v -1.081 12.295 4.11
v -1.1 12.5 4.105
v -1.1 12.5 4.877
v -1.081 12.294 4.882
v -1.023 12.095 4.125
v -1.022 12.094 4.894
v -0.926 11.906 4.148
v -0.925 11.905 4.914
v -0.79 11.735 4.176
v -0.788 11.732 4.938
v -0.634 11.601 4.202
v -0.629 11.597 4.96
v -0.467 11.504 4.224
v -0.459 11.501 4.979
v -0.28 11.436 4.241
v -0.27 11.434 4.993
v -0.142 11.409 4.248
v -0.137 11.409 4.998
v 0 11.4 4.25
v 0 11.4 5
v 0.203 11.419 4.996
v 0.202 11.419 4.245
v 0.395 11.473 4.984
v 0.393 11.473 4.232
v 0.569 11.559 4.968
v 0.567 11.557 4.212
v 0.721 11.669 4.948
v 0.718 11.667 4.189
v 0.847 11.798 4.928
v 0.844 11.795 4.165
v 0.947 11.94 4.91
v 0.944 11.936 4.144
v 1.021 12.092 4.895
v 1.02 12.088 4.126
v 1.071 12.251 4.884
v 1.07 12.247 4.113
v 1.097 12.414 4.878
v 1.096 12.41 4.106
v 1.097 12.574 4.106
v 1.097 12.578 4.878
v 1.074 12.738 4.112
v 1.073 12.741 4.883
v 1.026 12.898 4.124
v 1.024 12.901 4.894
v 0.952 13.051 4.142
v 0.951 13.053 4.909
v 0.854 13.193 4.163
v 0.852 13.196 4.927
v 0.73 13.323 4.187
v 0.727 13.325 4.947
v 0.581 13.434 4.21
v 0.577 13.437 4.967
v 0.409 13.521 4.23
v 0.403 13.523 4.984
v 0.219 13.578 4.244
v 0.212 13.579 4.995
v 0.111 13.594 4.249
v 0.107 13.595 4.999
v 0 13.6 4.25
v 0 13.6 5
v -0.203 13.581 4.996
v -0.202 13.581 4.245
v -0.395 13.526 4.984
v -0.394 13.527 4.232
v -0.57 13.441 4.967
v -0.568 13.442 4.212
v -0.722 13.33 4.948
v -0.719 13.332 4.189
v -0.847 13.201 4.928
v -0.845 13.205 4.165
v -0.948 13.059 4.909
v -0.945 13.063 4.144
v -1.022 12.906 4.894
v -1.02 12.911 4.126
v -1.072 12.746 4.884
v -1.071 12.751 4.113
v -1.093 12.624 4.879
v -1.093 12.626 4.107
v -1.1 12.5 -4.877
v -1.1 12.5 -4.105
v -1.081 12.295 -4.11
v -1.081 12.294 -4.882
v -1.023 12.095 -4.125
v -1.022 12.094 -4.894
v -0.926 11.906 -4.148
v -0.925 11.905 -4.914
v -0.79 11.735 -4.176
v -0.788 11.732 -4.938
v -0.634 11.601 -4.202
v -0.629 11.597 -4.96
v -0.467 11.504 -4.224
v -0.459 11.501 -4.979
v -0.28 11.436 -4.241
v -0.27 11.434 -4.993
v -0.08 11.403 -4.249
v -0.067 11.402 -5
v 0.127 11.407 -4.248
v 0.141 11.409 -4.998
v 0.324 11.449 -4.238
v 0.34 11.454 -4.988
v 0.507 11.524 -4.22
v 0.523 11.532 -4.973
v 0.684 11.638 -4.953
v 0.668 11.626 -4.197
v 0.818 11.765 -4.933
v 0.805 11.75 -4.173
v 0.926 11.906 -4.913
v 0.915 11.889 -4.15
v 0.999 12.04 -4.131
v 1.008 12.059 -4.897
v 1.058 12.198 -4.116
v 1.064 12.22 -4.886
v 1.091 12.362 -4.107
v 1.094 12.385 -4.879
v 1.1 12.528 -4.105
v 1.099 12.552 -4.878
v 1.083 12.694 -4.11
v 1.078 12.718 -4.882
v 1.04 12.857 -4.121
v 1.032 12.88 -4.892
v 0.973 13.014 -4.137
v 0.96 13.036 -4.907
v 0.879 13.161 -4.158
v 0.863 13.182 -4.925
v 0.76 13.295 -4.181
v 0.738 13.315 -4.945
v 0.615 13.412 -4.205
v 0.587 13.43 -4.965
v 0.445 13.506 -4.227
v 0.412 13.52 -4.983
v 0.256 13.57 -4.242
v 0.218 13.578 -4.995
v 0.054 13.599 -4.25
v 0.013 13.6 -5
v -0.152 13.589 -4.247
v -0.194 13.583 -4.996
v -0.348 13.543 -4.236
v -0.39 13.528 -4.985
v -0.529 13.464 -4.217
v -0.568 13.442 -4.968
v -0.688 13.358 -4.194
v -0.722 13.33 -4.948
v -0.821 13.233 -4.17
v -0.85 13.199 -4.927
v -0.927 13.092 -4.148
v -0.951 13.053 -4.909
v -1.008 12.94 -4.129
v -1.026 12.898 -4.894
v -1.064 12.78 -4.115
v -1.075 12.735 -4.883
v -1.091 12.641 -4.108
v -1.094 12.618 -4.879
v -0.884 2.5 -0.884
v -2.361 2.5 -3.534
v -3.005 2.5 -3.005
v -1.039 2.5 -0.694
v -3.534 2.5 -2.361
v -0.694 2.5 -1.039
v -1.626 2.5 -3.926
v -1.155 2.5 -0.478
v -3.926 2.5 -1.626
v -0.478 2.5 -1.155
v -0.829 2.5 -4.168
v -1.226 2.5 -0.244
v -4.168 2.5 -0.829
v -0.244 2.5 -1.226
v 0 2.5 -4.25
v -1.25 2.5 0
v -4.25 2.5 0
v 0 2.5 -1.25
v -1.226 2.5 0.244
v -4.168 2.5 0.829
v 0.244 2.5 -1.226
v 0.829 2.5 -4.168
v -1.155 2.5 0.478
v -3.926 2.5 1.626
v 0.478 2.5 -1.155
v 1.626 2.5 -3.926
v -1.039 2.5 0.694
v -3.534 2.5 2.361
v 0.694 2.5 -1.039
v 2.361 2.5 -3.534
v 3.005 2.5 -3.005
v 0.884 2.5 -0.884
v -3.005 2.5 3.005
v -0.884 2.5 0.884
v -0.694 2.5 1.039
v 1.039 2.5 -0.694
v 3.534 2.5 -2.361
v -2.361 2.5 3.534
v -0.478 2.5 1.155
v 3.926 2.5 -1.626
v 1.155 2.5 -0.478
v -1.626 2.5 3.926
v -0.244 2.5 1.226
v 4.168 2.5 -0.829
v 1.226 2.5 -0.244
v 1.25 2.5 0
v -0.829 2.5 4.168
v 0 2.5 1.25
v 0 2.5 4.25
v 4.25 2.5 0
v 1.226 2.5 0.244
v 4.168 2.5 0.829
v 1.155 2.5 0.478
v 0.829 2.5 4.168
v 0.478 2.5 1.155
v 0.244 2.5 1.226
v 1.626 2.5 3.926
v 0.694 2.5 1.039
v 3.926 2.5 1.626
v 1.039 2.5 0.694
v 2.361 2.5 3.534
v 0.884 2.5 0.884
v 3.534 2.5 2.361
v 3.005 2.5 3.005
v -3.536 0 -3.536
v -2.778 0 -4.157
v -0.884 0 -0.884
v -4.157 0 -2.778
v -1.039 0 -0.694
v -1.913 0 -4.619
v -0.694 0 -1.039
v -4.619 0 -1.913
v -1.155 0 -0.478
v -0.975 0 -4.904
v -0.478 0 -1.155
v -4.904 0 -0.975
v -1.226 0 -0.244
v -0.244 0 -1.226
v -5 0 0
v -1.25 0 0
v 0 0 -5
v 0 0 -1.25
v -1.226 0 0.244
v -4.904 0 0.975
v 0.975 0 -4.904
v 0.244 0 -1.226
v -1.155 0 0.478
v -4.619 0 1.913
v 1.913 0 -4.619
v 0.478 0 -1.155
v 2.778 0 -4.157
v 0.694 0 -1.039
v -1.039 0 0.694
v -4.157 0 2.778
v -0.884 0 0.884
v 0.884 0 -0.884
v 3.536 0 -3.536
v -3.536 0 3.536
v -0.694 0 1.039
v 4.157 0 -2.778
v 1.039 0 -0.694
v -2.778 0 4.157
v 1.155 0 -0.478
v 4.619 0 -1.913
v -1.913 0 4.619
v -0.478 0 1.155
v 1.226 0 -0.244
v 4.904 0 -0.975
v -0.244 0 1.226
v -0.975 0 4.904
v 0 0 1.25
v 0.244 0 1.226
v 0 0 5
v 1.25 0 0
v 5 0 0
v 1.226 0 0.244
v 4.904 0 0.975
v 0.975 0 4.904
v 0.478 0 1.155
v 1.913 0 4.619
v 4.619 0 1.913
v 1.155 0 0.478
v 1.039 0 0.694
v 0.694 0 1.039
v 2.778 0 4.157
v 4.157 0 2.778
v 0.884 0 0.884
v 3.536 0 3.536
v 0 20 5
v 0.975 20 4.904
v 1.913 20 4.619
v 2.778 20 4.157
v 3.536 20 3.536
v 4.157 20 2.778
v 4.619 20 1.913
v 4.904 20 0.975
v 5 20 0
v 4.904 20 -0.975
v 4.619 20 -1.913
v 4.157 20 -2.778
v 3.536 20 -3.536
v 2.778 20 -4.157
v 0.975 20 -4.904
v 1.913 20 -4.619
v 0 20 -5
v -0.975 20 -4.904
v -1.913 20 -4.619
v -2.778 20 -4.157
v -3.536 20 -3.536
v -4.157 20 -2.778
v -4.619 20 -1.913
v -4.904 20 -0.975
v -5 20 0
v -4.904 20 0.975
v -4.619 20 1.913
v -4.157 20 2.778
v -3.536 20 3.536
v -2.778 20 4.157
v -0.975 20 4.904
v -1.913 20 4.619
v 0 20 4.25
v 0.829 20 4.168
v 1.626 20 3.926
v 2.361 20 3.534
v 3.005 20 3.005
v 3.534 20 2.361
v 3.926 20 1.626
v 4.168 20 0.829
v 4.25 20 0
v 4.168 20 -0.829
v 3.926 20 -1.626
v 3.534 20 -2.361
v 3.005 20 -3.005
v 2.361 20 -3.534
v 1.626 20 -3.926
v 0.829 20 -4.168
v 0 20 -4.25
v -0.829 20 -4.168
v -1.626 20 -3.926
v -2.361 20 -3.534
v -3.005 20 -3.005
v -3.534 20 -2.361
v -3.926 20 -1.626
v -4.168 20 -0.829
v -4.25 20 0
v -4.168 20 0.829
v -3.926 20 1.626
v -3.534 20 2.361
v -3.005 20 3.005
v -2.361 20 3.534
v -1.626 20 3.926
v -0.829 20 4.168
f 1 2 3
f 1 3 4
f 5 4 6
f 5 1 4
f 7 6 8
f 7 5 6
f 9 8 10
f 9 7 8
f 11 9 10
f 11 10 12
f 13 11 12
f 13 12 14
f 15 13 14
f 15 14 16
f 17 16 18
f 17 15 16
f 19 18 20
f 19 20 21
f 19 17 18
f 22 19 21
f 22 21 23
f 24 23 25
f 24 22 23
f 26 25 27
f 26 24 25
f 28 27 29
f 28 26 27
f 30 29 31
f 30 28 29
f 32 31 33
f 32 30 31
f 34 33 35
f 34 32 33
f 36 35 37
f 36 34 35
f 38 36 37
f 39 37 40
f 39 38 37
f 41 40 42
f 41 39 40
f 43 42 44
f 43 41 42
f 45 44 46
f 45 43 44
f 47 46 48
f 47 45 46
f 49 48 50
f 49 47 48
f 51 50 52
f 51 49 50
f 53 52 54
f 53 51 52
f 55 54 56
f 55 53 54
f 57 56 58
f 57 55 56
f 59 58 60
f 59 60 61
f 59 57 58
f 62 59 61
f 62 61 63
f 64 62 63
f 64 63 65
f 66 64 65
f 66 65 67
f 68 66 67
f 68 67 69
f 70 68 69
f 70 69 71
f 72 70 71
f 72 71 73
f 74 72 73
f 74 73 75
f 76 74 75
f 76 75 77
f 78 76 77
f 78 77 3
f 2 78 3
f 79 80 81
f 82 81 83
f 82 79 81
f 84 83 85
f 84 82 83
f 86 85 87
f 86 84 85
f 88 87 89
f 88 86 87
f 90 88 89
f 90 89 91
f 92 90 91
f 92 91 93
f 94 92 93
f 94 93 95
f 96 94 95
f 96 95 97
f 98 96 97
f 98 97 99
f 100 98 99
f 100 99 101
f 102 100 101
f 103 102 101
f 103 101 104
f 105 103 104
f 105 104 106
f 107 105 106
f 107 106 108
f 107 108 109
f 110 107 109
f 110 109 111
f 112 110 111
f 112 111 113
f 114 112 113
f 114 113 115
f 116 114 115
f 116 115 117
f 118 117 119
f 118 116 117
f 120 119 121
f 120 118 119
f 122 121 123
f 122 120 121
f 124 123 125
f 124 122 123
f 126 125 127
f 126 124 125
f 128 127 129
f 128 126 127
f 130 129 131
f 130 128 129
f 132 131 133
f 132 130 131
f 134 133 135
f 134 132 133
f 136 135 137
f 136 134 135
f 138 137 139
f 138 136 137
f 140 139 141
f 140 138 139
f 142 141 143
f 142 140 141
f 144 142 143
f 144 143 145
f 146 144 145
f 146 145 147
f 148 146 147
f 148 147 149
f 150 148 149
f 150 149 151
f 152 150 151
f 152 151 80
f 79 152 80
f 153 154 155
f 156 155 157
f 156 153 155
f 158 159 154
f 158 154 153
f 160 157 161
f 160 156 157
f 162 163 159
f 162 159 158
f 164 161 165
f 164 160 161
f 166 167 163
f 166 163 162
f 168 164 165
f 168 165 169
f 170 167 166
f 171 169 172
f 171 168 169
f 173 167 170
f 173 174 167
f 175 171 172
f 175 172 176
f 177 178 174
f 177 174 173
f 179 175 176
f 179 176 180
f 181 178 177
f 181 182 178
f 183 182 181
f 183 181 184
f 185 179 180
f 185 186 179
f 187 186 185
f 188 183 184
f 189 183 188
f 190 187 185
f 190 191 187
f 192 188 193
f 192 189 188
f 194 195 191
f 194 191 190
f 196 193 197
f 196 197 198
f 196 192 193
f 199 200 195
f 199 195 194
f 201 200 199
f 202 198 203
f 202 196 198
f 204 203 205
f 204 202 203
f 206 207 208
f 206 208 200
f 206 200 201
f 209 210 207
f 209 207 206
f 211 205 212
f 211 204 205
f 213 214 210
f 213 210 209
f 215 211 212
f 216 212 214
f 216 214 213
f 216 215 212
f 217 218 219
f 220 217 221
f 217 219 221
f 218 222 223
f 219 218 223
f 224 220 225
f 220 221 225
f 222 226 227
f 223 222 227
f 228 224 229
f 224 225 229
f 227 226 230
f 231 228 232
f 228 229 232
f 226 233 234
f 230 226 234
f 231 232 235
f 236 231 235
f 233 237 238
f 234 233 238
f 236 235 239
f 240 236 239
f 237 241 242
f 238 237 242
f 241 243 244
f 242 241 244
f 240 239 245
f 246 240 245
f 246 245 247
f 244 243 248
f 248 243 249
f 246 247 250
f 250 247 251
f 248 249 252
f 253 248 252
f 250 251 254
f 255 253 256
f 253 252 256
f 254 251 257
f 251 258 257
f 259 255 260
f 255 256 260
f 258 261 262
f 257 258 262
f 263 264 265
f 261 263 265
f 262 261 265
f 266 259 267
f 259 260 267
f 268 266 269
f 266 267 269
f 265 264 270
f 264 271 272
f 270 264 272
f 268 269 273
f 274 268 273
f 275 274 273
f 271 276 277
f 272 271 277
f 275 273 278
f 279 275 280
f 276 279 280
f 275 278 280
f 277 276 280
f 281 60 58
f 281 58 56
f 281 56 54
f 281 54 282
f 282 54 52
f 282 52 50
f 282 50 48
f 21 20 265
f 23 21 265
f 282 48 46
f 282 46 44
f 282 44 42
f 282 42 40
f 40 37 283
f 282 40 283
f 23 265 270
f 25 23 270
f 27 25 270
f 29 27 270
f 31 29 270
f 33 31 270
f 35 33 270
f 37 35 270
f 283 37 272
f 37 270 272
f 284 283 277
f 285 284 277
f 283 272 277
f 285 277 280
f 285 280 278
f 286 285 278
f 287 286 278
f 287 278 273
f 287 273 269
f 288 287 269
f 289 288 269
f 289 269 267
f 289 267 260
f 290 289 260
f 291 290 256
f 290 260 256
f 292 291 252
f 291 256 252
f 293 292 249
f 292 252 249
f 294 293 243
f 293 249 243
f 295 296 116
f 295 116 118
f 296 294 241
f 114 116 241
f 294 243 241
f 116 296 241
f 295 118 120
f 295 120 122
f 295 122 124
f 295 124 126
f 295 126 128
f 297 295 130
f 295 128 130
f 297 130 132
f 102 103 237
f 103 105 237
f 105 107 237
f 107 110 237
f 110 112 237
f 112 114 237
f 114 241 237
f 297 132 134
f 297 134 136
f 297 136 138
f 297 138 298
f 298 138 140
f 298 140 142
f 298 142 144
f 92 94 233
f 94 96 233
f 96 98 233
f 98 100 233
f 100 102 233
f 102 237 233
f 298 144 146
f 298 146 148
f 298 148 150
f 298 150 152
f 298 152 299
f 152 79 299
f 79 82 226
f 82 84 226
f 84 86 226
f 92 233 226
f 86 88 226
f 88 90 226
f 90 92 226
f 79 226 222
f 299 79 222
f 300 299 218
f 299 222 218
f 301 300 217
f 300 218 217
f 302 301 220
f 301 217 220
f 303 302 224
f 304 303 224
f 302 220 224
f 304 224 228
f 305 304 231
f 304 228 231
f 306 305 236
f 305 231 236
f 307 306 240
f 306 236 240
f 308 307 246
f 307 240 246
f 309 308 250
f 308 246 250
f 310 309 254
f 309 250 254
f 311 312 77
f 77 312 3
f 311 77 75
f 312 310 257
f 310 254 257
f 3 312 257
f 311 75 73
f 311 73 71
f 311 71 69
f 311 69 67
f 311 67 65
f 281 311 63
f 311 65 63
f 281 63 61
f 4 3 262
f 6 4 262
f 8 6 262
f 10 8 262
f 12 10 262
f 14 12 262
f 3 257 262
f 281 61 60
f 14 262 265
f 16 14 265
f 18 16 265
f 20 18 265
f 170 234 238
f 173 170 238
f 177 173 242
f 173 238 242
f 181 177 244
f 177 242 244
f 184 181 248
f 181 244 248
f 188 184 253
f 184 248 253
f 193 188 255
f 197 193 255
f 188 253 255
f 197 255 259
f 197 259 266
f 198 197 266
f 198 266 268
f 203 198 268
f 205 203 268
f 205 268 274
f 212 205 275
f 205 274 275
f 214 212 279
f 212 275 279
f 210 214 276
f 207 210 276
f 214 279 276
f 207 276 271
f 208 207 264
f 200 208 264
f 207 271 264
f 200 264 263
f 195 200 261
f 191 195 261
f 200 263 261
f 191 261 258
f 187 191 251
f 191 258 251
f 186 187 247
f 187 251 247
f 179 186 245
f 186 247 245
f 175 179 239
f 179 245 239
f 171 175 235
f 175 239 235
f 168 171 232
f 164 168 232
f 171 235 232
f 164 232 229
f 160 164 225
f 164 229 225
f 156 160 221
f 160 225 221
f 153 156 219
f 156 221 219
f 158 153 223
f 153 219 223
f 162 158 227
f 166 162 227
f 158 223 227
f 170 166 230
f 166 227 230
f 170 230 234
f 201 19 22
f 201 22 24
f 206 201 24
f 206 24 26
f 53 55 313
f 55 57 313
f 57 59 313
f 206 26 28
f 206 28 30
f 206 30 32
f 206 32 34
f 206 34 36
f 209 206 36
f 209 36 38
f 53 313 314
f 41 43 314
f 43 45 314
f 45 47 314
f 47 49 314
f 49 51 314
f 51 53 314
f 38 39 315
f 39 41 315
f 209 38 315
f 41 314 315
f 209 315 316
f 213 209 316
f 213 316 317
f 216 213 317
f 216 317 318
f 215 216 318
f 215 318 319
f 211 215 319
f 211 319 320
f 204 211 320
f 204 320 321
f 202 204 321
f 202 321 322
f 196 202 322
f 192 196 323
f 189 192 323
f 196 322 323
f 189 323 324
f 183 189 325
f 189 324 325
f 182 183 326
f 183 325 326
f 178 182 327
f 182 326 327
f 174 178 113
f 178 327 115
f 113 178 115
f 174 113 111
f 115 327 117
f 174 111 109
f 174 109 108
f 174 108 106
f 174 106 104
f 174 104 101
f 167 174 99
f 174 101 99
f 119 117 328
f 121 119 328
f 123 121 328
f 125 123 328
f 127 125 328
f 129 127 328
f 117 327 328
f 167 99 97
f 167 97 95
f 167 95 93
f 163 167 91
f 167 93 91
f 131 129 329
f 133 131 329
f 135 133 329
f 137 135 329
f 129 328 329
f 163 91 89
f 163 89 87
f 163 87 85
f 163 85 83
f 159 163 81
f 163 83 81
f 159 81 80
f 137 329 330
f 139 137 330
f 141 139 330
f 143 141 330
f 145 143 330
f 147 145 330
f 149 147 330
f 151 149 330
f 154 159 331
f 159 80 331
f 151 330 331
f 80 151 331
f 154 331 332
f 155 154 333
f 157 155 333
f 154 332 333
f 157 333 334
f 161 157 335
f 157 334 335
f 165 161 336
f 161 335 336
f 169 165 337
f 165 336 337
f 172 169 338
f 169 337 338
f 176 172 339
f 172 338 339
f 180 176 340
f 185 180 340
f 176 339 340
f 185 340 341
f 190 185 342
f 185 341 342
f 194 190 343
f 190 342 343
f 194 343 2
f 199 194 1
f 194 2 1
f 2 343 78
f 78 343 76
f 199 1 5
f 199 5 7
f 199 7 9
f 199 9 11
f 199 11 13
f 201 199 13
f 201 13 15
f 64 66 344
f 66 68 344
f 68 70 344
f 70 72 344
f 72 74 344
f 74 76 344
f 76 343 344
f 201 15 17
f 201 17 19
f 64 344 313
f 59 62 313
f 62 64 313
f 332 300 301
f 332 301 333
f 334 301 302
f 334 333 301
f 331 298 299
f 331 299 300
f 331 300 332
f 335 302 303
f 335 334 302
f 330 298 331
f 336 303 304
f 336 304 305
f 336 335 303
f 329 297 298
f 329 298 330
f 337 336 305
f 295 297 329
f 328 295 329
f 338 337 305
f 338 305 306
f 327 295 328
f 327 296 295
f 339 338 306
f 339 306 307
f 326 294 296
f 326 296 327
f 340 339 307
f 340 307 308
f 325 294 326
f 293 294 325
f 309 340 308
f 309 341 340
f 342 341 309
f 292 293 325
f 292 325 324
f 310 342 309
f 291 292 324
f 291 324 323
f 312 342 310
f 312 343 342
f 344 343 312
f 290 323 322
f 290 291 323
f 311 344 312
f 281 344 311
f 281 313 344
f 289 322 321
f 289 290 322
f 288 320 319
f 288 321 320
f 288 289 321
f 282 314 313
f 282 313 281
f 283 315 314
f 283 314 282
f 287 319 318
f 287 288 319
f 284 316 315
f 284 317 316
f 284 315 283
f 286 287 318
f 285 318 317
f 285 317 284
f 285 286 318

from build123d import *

# Parameters (mm, degrees)
SKETCH1_R               = 5
BOSS_EXTRUDE1_DEPTH     = 20
SKETCH2_R               = 4.25
CUT_EXTRUDE1_DEPTH      = 17.5
SKETCH3_R               = 1.25
CUT_EXTRUDE2_DEPTH      = 2.5
CUT_EXTRUDE3_DEPTH      = 10
CUT_EXTRUDE3_DEPTH_BACK = 10
SKETCH4_R               = 1.1


with BuildPart() as part:
    # Sketch1 → Boss-Extrude1 (new body)
    with BuildSketch(Plane(origin=(0, 0, 0), x_dir=(1, 0, 0), z_dir=(0, 1, 0))):
        Circle(SKETCH1_R)
    extrude(amount=BOSS_EXTRUDE1_DEPTH)

    # Sketch2 → Cut-Extrude1 (cut)
    with BuildSketch(Plane(origin=(0, 20, 0), x_dir=(1, 0, 0), z_dir=(0, 1, 0))):
        Circle(SKETCH2_R)
    extrude(amount=-CUT_EXTRUDE1_DEPTH, mode=Mode.SUBTRACT)

    # Sketch3 → Cut-Extrude2 (cut)
    with BuildSketch(Plane.XZ):
        Circle(SKETCH3_R)
    extrude(amount=-CUT_EXTRUDE2_DEPTH, mode=Mode.SUBTRACT)

    # Sketch4 → Cut-Extrude3 (cut, two sides: drawn at the far end of the back side and taken through both)
    with BuildSketch(Plane.XY.offset(-CUT_EXTRUDE3_DEPTH_BACK)):
        with Locations((0, 12.5)):
            Circle(SKETCH4_R)
    extrude(amount=CUT_EXTRUDE3_DEPTH + CUT_EXTRUDE3_DEPTH_BACK, mode=Mode.SUBTRACT)


solid = part.part
